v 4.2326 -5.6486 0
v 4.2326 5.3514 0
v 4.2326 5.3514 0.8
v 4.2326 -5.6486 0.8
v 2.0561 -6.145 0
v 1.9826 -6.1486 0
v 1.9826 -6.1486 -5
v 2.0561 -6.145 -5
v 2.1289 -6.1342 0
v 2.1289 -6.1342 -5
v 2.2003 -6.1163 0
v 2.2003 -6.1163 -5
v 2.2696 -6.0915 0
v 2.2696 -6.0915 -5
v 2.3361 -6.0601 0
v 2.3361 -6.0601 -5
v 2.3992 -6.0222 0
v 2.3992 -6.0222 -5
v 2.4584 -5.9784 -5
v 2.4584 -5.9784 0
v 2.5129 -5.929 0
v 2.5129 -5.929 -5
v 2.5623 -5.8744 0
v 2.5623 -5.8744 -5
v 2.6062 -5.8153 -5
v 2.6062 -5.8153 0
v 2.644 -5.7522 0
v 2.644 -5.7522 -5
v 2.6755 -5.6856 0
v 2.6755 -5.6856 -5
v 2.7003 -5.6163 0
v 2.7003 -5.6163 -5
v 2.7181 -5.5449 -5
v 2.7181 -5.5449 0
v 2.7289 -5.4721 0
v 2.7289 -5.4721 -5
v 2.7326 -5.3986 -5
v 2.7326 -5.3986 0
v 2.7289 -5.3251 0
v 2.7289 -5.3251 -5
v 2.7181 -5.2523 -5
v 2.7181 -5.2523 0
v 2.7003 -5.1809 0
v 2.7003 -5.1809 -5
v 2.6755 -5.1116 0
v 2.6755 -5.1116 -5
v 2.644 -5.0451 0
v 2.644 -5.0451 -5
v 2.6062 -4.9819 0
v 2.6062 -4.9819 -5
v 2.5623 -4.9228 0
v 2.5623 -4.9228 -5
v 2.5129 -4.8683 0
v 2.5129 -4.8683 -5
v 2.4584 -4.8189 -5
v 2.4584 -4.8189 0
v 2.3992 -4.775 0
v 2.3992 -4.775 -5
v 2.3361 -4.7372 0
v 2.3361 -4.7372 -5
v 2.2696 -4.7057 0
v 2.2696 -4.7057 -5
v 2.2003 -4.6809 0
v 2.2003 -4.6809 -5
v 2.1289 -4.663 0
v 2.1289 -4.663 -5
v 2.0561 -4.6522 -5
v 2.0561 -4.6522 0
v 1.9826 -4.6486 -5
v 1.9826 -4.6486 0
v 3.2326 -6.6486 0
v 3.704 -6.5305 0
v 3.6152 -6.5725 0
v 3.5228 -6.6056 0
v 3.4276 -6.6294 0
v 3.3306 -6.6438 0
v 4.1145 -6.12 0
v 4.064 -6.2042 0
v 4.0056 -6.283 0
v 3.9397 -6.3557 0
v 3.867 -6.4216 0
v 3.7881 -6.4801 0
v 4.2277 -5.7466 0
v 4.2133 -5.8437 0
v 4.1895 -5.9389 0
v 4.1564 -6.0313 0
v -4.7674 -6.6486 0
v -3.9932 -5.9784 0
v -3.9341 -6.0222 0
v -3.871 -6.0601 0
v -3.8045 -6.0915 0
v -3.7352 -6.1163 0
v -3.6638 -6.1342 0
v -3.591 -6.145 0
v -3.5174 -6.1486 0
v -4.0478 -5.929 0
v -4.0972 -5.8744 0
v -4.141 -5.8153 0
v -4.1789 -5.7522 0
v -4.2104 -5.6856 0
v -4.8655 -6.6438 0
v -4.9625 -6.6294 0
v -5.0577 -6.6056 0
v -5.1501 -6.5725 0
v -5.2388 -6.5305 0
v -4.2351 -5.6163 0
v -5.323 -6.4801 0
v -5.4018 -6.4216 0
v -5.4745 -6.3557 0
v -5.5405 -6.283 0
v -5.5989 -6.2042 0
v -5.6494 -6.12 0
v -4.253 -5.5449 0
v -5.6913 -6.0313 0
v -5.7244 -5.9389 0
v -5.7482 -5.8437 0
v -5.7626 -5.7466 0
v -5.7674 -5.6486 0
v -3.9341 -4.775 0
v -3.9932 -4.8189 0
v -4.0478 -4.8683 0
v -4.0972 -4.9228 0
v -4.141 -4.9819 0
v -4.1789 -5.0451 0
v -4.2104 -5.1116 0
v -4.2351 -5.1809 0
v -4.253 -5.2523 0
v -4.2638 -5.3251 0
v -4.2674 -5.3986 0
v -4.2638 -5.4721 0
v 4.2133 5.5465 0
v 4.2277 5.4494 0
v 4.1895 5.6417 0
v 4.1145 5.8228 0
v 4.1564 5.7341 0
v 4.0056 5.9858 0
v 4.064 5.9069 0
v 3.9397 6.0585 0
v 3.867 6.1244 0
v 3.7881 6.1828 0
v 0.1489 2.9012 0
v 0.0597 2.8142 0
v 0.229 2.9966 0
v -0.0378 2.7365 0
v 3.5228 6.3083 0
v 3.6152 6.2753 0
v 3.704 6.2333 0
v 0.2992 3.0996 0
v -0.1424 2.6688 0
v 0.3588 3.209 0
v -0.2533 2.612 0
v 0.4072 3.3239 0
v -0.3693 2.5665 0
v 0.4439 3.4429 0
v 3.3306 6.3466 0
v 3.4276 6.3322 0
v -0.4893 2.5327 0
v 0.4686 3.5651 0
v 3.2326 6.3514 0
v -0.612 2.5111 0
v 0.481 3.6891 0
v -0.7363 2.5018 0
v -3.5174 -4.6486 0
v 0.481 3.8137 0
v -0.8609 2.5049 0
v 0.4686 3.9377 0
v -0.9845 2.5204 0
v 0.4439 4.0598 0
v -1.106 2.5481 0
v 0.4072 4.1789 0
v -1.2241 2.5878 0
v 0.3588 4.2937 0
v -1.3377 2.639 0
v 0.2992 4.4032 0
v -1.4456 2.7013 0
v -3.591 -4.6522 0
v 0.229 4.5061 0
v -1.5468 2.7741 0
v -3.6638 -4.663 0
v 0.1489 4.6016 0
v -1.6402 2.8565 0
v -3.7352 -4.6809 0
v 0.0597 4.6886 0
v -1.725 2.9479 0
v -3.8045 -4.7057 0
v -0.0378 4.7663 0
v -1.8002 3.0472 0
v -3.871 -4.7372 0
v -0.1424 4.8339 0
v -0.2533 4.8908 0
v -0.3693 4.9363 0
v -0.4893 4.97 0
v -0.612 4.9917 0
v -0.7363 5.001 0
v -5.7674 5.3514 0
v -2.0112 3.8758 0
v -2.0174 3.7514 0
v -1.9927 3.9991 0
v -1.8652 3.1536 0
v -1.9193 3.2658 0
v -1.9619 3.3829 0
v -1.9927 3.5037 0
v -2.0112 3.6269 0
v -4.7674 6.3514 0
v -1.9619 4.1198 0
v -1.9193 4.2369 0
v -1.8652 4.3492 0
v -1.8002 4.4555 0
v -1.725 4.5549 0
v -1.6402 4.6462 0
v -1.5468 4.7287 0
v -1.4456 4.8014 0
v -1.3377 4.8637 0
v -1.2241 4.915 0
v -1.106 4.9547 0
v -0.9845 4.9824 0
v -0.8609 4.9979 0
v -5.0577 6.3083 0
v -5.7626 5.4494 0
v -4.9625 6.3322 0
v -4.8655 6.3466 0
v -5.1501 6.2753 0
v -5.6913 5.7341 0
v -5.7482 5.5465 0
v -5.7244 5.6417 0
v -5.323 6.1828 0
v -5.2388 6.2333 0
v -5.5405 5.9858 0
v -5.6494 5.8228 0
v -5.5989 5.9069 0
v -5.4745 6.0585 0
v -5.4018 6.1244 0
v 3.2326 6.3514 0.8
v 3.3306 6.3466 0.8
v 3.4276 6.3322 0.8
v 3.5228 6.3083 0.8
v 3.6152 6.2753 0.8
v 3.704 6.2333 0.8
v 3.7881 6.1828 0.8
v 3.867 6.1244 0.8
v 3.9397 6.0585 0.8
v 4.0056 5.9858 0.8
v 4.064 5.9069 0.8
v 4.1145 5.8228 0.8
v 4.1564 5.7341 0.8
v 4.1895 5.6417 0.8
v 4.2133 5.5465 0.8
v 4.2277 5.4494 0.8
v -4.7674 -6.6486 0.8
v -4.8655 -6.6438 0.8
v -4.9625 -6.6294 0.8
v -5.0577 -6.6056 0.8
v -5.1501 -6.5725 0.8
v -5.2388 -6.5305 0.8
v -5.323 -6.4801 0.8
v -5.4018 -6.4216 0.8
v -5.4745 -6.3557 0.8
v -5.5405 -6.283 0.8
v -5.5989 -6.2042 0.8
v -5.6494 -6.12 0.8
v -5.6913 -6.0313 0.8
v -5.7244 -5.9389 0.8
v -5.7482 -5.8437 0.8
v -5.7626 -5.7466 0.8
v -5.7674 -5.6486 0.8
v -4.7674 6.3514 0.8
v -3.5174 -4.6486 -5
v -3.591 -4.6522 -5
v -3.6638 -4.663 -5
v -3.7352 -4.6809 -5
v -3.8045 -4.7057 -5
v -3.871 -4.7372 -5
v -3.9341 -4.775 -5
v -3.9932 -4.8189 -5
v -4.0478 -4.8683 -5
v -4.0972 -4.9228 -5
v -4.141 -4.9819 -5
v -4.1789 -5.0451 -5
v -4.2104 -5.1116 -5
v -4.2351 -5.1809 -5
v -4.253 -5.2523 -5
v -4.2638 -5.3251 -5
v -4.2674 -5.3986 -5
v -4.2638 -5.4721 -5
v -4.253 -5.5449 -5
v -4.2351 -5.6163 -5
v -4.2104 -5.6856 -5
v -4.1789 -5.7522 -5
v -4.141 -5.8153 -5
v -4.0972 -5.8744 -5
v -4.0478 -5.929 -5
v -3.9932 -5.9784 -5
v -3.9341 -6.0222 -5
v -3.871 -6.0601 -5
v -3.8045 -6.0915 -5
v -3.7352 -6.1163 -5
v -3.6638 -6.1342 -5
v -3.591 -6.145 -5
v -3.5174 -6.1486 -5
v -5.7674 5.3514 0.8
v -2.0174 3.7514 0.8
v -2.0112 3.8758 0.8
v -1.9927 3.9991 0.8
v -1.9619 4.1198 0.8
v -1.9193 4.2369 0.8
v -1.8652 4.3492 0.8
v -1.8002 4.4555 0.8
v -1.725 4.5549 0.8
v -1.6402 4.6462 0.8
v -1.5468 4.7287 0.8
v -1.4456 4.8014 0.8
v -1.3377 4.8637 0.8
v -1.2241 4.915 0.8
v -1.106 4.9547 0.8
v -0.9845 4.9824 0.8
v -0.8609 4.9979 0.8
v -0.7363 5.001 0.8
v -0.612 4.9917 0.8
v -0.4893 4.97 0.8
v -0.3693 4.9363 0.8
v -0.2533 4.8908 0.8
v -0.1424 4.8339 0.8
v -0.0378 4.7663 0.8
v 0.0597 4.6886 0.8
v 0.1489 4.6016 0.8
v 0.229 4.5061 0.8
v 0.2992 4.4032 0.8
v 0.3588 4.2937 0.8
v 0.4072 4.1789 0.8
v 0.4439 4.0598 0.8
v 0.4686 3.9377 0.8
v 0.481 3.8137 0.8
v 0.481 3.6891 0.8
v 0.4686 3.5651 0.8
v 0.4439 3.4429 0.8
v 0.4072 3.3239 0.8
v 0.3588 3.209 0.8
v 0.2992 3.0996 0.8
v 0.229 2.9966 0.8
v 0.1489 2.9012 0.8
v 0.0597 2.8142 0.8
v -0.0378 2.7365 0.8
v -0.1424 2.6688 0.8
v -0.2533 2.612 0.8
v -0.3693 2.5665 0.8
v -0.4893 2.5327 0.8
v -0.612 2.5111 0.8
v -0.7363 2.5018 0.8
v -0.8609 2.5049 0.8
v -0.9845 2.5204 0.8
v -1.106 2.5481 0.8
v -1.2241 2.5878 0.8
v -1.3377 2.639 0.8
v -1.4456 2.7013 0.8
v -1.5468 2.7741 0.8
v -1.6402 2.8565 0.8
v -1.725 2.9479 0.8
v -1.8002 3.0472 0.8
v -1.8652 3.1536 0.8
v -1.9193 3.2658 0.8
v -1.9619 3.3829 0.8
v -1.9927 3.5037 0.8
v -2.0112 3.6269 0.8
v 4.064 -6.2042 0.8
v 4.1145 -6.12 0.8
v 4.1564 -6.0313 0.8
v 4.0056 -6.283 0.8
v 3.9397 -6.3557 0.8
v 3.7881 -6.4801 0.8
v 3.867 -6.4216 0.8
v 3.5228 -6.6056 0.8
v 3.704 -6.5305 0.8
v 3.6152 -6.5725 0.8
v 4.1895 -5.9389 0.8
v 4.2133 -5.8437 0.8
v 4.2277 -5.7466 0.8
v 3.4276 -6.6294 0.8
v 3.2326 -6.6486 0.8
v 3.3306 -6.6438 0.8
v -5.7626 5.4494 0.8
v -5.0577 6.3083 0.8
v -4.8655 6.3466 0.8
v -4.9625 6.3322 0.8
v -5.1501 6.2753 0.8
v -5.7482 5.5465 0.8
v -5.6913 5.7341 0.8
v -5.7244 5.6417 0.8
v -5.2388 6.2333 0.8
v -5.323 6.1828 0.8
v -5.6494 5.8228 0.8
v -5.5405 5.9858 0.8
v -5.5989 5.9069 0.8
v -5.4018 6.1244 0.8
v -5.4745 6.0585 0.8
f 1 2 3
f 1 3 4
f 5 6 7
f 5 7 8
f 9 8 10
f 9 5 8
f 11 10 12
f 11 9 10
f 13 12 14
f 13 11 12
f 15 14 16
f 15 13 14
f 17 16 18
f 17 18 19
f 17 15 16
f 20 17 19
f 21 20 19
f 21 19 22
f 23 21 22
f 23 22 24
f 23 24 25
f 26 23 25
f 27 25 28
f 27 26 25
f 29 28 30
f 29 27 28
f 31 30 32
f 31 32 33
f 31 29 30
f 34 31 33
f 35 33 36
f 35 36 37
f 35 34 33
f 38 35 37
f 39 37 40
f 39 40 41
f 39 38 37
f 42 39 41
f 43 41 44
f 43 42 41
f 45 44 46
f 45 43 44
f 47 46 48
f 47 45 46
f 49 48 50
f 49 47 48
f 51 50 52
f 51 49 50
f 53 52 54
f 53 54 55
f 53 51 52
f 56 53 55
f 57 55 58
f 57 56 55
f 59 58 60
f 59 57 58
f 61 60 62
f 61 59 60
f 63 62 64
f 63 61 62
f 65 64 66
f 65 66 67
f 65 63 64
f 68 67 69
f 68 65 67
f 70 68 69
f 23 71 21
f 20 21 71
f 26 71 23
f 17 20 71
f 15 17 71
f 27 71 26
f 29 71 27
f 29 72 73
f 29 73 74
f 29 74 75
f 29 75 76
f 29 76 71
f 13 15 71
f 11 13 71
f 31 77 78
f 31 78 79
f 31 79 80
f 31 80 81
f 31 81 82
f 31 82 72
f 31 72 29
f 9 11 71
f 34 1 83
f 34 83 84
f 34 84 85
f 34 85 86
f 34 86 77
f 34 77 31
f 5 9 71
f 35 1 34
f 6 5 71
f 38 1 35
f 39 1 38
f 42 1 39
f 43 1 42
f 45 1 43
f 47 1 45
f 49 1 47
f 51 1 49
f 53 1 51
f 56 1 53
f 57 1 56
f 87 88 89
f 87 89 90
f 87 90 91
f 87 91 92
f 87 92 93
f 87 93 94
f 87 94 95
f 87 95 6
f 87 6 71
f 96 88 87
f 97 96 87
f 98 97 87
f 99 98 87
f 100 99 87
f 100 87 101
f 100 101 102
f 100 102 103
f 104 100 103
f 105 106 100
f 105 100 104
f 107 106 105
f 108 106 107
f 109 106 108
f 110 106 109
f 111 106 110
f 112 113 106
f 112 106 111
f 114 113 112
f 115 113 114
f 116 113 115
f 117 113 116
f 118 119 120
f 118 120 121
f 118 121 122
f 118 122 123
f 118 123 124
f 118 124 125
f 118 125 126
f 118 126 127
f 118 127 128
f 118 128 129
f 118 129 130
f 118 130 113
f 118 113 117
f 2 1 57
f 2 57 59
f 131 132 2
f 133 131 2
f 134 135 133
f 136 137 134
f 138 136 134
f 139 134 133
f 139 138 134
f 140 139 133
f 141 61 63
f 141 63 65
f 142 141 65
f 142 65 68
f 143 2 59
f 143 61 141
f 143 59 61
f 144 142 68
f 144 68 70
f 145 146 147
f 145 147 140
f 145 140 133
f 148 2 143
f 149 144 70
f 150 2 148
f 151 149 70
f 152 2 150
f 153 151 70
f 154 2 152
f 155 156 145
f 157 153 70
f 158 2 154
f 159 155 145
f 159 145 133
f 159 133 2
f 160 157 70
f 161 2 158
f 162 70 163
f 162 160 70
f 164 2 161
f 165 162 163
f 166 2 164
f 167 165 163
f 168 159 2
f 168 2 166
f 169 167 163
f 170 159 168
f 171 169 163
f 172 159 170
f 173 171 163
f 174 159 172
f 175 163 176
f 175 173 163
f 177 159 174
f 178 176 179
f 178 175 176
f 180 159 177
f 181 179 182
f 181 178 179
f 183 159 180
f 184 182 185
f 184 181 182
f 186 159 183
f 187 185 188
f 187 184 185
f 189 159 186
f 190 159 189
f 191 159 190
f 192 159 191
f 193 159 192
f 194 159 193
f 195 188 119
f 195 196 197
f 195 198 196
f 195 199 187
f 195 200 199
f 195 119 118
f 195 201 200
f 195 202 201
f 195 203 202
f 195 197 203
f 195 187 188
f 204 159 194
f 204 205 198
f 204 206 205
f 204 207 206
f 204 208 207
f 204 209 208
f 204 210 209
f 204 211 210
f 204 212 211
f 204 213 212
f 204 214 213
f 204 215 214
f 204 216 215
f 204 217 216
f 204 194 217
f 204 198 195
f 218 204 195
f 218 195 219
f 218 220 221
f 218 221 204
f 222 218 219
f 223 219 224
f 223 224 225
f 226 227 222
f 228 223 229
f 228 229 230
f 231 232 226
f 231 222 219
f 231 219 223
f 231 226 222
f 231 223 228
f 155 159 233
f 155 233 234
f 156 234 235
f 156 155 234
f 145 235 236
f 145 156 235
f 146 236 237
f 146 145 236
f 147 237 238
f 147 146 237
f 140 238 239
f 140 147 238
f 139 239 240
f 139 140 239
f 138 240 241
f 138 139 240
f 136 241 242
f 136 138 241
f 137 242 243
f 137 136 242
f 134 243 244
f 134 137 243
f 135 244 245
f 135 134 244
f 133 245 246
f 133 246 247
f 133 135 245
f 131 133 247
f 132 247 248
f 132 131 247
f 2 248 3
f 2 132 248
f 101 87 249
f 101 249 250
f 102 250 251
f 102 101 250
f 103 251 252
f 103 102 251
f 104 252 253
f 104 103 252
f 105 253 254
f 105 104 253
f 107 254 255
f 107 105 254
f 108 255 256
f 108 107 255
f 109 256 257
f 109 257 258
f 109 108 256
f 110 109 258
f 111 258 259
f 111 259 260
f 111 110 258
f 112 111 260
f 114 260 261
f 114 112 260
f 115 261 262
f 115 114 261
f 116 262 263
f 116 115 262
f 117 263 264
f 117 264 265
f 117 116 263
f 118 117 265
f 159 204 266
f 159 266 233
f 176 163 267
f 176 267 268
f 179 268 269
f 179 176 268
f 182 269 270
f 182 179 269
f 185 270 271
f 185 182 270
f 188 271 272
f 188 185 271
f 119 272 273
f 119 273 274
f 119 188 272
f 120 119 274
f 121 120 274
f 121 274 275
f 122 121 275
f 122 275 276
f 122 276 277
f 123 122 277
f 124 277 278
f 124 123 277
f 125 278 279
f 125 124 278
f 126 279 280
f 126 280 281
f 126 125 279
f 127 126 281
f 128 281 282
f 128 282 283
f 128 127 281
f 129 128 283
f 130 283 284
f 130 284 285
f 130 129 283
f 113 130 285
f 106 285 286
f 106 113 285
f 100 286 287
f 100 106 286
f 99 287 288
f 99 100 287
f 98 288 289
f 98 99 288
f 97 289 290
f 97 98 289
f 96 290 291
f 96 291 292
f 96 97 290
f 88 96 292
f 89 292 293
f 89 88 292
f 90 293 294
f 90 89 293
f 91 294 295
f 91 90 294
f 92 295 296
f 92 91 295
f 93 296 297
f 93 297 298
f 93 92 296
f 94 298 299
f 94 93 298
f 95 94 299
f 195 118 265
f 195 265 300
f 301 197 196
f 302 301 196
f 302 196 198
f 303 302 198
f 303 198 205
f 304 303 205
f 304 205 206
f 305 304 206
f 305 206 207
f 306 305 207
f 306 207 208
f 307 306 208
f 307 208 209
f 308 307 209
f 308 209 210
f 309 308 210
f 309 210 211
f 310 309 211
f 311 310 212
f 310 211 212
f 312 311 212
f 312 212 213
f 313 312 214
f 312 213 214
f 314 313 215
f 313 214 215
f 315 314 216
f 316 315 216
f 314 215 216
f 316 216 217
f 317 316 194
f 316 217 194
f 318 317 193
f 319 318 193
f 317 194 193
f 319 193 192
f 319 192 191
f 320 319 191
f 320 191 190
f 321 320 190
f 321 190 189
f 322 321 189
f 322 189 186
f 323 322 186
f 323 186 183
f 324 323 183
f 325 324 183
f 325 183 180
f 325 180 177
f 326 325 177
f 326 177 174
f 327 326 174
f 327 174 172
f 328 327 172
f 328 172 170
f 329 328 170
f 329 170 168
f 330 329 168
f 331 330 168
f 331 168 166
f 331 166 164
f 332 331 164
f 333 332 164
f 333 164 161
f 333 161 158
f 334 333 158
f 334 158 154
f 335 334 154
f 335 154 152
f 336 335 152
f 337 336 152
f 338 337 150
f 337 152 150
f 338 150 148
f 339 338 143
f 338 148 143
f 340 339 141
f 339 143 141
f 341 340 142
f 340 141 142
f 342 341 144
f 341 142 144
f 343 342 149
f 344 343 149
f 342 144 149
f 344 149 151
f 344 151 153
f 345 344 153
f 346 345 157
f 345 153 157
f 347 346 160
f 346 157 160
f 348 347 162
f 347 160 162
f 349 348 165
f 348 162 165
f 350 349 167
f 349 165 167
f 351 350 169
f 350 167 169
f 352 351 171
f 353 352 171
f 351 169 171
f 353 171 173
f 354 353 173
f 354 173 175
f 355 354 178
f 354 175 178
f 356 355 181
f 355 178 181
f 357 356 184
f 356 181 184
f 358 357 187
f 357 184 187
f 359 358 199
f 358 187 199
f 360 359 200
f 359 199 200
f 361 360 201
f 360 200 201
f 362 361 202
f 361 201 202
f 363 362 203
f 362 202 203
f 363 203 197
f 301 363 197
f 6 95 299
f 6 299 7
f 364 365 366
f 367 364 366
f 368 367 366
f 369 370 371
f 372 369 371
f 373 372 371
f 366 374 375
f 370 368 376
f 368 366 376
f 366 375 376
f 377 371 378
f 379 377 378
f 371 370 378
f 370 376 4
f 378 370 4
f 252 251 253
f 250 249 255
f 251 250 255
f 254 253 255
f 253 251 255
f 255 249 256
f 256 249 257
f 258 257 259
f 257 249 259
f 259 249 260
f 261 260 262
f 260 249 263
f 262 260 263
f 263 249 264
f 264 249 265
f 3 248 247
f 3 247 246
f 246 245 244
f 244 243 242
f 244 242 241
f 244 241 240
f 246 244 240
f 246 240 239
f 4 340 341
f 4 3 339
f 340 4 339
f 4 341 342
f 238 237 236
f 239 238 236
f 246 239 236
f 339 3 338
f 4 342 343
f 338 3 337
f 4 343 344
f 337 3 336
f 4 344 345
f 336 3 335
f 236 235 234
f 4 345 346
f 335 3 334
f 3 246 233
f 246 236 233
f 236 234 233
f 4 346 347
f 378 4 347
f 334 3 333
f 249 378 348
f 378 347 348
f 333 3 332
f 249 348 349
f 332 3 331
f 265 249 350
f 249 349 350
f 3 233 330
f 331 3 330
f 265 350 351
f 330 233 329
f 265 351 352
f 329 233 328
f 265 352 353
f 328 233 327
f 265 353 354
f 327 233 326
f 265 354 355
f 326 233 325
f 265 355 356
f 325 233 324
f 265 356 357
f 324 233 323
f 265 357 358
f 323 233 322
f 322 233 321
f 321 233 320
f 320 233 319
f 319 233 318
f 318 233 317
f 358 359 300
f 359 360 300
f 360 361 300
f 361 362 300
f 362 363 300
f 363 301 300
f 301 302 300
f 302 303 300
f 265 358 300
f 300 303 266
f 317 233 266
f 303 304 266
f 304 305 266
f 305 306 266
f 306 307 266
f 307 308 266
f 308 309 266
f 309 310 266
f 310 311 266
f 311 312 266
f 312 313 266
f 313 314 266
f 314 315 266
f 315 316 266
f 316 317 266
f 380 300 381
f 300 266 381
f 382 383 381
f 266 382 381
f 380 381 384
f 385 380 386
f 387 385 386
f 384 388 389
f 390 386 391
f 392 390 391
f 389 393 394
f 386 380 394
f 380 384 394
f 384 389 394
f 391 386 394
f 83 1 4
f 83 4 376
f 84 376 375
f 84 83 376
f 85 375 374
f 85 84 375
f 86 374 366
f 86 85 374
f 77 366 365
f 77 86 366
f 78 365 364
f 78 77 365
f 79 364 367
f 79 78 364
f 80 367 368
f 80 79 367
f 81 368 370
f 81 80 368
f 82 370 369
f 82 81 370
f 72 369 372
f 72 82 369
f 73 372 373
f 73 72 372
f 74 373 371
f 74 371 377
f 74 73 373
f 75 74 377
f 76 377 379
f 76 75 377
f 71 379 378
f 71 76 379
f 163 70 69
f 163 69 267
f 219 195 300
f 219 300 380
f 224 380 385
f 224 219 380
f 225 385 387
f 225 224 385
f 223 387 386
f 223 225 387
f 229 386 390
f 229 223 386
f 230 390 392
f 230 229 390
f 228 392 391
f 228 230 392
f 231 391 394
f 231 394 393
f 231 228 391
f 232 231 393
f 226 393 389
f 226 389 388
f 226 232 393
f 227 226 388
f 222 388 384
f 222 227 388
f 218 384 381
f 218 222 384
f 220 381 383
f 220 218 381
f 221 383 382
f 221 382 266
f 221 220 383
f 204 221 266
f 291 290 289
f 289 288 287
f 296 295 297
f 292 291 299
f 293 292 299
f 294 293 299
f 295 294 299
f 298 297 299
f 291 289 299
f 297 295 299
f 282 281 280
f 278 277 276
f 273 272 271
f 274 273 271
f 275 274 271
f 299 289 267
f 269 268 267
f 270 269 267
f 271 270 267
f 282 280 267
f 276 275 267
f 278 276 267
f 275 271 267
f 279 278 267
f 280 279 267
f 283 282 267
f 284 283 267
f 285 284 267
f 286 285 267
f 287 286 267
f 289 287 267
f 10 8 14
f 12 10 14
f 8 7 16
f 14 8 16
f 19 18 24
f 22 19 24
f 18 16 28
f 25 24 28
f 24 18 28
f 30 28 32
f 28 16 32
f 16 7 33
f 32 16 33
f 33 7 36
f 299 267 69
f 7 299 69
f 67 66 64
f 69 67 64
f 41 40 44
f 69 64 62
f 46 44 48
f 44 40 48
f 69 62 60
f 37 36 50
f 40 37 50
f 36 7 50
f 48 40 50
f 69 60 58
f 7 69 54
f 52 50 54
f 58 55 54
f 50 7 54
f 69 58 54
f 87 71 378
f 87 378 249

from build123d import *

# Parameters (mm, degrees)
EXTRUDE_1_DEPTH     = 0.8
CUT_EXTRUDE_1_REACH = 2.8
SKETCH_2_R          = 1.25
EXTRUDE_2_DEPTH     = 5


with BuildPart() as part:
    # 草图1 → 凸台-拉伸1 (new body)
    with BuildSketch(Plane.XY):
        with BuildLine():
            Line((-4.76744186, 6.351378938), (3.23255814, 6.351378938))
            ThreePointArc((3.23255814, 6.351378938), (3.939664921, 6.058485719), (4.23255814, 5.351378938))
            Line((4.23255814, 5.351378938), (4.23255814, -5.648621062))
            ThreePointArc((4.23255814, -5.648621062), (3.939664921, -6.355727843), (3.23255814, -6.648621062))
            Line((3.23255814, -6.648621062), (-4.76744186, -6.648621062))
            ThreePointArc((-4.76744186, -6.648621062), (-5.474548642, -6.355727843), (-5.76744186, -5.648621062))
            Line((-5.76744186, -5.648621062), (-5.76744186, 5.351378938))
            ThreePointArc((-5.76744186, 5.351378938), (-5.474548642, 6.058485719), (-4.76744186, 6.351378938))
        make_face()
    extrude(amount=EXTRUDE_1_DEPTH)

    # 草图2 → 切除-拉伸1 (cut, up to next)
    with BuildSketch(Plane(origin=(0, 0, 0), x_dir=(-1, 0, 0), z_dir=(0, 0, -1)), mode=Mode.PRIVATE) as cut_extrude_1_sk1:
        with Locations((0.76744186, 3.751378938)):
            Circle(SKETCH_2_R)
    cut_extrude_1_tool1 = extrude(cut_extrude_1_sk1.sketch, amount=-CUT_EXTRUDE_1_REACH, mode=Mode.PRIVATE) & part.part
    add(cut_extrude_1_tool1.solids().sort_by_distance((-0.767442, 3.751379, 0))[0], mode=Mode.SUBTRACT)

    # 草图3 → 凸台-拉伸2 (add)
    with BuildSketch(Plane(origin=(0, 0, 0), x_dir=(-1, 0, 0), z_dir=(0, 0, -1))):
        with BuildLine():
            Line((-1.98255814, -4.648621062), (3.51744186, -4.648621062))
            ThreePointArc((3.51744186, -4.648621062), (4.26744186, -5.398621062), (3.51744186, -6.148621062))
            Line((3.51744186, -6.148621062), (-1.98255814, -6.148621062))
            ThreePointArc((-1.98255814, -6.148621062), (-2.73255814, -5.398621062), (-1.98255814, -4.648621062))
        make_face()
    extrude(amount=EXTRUDE_2_DEPTH)


solid = part.part
